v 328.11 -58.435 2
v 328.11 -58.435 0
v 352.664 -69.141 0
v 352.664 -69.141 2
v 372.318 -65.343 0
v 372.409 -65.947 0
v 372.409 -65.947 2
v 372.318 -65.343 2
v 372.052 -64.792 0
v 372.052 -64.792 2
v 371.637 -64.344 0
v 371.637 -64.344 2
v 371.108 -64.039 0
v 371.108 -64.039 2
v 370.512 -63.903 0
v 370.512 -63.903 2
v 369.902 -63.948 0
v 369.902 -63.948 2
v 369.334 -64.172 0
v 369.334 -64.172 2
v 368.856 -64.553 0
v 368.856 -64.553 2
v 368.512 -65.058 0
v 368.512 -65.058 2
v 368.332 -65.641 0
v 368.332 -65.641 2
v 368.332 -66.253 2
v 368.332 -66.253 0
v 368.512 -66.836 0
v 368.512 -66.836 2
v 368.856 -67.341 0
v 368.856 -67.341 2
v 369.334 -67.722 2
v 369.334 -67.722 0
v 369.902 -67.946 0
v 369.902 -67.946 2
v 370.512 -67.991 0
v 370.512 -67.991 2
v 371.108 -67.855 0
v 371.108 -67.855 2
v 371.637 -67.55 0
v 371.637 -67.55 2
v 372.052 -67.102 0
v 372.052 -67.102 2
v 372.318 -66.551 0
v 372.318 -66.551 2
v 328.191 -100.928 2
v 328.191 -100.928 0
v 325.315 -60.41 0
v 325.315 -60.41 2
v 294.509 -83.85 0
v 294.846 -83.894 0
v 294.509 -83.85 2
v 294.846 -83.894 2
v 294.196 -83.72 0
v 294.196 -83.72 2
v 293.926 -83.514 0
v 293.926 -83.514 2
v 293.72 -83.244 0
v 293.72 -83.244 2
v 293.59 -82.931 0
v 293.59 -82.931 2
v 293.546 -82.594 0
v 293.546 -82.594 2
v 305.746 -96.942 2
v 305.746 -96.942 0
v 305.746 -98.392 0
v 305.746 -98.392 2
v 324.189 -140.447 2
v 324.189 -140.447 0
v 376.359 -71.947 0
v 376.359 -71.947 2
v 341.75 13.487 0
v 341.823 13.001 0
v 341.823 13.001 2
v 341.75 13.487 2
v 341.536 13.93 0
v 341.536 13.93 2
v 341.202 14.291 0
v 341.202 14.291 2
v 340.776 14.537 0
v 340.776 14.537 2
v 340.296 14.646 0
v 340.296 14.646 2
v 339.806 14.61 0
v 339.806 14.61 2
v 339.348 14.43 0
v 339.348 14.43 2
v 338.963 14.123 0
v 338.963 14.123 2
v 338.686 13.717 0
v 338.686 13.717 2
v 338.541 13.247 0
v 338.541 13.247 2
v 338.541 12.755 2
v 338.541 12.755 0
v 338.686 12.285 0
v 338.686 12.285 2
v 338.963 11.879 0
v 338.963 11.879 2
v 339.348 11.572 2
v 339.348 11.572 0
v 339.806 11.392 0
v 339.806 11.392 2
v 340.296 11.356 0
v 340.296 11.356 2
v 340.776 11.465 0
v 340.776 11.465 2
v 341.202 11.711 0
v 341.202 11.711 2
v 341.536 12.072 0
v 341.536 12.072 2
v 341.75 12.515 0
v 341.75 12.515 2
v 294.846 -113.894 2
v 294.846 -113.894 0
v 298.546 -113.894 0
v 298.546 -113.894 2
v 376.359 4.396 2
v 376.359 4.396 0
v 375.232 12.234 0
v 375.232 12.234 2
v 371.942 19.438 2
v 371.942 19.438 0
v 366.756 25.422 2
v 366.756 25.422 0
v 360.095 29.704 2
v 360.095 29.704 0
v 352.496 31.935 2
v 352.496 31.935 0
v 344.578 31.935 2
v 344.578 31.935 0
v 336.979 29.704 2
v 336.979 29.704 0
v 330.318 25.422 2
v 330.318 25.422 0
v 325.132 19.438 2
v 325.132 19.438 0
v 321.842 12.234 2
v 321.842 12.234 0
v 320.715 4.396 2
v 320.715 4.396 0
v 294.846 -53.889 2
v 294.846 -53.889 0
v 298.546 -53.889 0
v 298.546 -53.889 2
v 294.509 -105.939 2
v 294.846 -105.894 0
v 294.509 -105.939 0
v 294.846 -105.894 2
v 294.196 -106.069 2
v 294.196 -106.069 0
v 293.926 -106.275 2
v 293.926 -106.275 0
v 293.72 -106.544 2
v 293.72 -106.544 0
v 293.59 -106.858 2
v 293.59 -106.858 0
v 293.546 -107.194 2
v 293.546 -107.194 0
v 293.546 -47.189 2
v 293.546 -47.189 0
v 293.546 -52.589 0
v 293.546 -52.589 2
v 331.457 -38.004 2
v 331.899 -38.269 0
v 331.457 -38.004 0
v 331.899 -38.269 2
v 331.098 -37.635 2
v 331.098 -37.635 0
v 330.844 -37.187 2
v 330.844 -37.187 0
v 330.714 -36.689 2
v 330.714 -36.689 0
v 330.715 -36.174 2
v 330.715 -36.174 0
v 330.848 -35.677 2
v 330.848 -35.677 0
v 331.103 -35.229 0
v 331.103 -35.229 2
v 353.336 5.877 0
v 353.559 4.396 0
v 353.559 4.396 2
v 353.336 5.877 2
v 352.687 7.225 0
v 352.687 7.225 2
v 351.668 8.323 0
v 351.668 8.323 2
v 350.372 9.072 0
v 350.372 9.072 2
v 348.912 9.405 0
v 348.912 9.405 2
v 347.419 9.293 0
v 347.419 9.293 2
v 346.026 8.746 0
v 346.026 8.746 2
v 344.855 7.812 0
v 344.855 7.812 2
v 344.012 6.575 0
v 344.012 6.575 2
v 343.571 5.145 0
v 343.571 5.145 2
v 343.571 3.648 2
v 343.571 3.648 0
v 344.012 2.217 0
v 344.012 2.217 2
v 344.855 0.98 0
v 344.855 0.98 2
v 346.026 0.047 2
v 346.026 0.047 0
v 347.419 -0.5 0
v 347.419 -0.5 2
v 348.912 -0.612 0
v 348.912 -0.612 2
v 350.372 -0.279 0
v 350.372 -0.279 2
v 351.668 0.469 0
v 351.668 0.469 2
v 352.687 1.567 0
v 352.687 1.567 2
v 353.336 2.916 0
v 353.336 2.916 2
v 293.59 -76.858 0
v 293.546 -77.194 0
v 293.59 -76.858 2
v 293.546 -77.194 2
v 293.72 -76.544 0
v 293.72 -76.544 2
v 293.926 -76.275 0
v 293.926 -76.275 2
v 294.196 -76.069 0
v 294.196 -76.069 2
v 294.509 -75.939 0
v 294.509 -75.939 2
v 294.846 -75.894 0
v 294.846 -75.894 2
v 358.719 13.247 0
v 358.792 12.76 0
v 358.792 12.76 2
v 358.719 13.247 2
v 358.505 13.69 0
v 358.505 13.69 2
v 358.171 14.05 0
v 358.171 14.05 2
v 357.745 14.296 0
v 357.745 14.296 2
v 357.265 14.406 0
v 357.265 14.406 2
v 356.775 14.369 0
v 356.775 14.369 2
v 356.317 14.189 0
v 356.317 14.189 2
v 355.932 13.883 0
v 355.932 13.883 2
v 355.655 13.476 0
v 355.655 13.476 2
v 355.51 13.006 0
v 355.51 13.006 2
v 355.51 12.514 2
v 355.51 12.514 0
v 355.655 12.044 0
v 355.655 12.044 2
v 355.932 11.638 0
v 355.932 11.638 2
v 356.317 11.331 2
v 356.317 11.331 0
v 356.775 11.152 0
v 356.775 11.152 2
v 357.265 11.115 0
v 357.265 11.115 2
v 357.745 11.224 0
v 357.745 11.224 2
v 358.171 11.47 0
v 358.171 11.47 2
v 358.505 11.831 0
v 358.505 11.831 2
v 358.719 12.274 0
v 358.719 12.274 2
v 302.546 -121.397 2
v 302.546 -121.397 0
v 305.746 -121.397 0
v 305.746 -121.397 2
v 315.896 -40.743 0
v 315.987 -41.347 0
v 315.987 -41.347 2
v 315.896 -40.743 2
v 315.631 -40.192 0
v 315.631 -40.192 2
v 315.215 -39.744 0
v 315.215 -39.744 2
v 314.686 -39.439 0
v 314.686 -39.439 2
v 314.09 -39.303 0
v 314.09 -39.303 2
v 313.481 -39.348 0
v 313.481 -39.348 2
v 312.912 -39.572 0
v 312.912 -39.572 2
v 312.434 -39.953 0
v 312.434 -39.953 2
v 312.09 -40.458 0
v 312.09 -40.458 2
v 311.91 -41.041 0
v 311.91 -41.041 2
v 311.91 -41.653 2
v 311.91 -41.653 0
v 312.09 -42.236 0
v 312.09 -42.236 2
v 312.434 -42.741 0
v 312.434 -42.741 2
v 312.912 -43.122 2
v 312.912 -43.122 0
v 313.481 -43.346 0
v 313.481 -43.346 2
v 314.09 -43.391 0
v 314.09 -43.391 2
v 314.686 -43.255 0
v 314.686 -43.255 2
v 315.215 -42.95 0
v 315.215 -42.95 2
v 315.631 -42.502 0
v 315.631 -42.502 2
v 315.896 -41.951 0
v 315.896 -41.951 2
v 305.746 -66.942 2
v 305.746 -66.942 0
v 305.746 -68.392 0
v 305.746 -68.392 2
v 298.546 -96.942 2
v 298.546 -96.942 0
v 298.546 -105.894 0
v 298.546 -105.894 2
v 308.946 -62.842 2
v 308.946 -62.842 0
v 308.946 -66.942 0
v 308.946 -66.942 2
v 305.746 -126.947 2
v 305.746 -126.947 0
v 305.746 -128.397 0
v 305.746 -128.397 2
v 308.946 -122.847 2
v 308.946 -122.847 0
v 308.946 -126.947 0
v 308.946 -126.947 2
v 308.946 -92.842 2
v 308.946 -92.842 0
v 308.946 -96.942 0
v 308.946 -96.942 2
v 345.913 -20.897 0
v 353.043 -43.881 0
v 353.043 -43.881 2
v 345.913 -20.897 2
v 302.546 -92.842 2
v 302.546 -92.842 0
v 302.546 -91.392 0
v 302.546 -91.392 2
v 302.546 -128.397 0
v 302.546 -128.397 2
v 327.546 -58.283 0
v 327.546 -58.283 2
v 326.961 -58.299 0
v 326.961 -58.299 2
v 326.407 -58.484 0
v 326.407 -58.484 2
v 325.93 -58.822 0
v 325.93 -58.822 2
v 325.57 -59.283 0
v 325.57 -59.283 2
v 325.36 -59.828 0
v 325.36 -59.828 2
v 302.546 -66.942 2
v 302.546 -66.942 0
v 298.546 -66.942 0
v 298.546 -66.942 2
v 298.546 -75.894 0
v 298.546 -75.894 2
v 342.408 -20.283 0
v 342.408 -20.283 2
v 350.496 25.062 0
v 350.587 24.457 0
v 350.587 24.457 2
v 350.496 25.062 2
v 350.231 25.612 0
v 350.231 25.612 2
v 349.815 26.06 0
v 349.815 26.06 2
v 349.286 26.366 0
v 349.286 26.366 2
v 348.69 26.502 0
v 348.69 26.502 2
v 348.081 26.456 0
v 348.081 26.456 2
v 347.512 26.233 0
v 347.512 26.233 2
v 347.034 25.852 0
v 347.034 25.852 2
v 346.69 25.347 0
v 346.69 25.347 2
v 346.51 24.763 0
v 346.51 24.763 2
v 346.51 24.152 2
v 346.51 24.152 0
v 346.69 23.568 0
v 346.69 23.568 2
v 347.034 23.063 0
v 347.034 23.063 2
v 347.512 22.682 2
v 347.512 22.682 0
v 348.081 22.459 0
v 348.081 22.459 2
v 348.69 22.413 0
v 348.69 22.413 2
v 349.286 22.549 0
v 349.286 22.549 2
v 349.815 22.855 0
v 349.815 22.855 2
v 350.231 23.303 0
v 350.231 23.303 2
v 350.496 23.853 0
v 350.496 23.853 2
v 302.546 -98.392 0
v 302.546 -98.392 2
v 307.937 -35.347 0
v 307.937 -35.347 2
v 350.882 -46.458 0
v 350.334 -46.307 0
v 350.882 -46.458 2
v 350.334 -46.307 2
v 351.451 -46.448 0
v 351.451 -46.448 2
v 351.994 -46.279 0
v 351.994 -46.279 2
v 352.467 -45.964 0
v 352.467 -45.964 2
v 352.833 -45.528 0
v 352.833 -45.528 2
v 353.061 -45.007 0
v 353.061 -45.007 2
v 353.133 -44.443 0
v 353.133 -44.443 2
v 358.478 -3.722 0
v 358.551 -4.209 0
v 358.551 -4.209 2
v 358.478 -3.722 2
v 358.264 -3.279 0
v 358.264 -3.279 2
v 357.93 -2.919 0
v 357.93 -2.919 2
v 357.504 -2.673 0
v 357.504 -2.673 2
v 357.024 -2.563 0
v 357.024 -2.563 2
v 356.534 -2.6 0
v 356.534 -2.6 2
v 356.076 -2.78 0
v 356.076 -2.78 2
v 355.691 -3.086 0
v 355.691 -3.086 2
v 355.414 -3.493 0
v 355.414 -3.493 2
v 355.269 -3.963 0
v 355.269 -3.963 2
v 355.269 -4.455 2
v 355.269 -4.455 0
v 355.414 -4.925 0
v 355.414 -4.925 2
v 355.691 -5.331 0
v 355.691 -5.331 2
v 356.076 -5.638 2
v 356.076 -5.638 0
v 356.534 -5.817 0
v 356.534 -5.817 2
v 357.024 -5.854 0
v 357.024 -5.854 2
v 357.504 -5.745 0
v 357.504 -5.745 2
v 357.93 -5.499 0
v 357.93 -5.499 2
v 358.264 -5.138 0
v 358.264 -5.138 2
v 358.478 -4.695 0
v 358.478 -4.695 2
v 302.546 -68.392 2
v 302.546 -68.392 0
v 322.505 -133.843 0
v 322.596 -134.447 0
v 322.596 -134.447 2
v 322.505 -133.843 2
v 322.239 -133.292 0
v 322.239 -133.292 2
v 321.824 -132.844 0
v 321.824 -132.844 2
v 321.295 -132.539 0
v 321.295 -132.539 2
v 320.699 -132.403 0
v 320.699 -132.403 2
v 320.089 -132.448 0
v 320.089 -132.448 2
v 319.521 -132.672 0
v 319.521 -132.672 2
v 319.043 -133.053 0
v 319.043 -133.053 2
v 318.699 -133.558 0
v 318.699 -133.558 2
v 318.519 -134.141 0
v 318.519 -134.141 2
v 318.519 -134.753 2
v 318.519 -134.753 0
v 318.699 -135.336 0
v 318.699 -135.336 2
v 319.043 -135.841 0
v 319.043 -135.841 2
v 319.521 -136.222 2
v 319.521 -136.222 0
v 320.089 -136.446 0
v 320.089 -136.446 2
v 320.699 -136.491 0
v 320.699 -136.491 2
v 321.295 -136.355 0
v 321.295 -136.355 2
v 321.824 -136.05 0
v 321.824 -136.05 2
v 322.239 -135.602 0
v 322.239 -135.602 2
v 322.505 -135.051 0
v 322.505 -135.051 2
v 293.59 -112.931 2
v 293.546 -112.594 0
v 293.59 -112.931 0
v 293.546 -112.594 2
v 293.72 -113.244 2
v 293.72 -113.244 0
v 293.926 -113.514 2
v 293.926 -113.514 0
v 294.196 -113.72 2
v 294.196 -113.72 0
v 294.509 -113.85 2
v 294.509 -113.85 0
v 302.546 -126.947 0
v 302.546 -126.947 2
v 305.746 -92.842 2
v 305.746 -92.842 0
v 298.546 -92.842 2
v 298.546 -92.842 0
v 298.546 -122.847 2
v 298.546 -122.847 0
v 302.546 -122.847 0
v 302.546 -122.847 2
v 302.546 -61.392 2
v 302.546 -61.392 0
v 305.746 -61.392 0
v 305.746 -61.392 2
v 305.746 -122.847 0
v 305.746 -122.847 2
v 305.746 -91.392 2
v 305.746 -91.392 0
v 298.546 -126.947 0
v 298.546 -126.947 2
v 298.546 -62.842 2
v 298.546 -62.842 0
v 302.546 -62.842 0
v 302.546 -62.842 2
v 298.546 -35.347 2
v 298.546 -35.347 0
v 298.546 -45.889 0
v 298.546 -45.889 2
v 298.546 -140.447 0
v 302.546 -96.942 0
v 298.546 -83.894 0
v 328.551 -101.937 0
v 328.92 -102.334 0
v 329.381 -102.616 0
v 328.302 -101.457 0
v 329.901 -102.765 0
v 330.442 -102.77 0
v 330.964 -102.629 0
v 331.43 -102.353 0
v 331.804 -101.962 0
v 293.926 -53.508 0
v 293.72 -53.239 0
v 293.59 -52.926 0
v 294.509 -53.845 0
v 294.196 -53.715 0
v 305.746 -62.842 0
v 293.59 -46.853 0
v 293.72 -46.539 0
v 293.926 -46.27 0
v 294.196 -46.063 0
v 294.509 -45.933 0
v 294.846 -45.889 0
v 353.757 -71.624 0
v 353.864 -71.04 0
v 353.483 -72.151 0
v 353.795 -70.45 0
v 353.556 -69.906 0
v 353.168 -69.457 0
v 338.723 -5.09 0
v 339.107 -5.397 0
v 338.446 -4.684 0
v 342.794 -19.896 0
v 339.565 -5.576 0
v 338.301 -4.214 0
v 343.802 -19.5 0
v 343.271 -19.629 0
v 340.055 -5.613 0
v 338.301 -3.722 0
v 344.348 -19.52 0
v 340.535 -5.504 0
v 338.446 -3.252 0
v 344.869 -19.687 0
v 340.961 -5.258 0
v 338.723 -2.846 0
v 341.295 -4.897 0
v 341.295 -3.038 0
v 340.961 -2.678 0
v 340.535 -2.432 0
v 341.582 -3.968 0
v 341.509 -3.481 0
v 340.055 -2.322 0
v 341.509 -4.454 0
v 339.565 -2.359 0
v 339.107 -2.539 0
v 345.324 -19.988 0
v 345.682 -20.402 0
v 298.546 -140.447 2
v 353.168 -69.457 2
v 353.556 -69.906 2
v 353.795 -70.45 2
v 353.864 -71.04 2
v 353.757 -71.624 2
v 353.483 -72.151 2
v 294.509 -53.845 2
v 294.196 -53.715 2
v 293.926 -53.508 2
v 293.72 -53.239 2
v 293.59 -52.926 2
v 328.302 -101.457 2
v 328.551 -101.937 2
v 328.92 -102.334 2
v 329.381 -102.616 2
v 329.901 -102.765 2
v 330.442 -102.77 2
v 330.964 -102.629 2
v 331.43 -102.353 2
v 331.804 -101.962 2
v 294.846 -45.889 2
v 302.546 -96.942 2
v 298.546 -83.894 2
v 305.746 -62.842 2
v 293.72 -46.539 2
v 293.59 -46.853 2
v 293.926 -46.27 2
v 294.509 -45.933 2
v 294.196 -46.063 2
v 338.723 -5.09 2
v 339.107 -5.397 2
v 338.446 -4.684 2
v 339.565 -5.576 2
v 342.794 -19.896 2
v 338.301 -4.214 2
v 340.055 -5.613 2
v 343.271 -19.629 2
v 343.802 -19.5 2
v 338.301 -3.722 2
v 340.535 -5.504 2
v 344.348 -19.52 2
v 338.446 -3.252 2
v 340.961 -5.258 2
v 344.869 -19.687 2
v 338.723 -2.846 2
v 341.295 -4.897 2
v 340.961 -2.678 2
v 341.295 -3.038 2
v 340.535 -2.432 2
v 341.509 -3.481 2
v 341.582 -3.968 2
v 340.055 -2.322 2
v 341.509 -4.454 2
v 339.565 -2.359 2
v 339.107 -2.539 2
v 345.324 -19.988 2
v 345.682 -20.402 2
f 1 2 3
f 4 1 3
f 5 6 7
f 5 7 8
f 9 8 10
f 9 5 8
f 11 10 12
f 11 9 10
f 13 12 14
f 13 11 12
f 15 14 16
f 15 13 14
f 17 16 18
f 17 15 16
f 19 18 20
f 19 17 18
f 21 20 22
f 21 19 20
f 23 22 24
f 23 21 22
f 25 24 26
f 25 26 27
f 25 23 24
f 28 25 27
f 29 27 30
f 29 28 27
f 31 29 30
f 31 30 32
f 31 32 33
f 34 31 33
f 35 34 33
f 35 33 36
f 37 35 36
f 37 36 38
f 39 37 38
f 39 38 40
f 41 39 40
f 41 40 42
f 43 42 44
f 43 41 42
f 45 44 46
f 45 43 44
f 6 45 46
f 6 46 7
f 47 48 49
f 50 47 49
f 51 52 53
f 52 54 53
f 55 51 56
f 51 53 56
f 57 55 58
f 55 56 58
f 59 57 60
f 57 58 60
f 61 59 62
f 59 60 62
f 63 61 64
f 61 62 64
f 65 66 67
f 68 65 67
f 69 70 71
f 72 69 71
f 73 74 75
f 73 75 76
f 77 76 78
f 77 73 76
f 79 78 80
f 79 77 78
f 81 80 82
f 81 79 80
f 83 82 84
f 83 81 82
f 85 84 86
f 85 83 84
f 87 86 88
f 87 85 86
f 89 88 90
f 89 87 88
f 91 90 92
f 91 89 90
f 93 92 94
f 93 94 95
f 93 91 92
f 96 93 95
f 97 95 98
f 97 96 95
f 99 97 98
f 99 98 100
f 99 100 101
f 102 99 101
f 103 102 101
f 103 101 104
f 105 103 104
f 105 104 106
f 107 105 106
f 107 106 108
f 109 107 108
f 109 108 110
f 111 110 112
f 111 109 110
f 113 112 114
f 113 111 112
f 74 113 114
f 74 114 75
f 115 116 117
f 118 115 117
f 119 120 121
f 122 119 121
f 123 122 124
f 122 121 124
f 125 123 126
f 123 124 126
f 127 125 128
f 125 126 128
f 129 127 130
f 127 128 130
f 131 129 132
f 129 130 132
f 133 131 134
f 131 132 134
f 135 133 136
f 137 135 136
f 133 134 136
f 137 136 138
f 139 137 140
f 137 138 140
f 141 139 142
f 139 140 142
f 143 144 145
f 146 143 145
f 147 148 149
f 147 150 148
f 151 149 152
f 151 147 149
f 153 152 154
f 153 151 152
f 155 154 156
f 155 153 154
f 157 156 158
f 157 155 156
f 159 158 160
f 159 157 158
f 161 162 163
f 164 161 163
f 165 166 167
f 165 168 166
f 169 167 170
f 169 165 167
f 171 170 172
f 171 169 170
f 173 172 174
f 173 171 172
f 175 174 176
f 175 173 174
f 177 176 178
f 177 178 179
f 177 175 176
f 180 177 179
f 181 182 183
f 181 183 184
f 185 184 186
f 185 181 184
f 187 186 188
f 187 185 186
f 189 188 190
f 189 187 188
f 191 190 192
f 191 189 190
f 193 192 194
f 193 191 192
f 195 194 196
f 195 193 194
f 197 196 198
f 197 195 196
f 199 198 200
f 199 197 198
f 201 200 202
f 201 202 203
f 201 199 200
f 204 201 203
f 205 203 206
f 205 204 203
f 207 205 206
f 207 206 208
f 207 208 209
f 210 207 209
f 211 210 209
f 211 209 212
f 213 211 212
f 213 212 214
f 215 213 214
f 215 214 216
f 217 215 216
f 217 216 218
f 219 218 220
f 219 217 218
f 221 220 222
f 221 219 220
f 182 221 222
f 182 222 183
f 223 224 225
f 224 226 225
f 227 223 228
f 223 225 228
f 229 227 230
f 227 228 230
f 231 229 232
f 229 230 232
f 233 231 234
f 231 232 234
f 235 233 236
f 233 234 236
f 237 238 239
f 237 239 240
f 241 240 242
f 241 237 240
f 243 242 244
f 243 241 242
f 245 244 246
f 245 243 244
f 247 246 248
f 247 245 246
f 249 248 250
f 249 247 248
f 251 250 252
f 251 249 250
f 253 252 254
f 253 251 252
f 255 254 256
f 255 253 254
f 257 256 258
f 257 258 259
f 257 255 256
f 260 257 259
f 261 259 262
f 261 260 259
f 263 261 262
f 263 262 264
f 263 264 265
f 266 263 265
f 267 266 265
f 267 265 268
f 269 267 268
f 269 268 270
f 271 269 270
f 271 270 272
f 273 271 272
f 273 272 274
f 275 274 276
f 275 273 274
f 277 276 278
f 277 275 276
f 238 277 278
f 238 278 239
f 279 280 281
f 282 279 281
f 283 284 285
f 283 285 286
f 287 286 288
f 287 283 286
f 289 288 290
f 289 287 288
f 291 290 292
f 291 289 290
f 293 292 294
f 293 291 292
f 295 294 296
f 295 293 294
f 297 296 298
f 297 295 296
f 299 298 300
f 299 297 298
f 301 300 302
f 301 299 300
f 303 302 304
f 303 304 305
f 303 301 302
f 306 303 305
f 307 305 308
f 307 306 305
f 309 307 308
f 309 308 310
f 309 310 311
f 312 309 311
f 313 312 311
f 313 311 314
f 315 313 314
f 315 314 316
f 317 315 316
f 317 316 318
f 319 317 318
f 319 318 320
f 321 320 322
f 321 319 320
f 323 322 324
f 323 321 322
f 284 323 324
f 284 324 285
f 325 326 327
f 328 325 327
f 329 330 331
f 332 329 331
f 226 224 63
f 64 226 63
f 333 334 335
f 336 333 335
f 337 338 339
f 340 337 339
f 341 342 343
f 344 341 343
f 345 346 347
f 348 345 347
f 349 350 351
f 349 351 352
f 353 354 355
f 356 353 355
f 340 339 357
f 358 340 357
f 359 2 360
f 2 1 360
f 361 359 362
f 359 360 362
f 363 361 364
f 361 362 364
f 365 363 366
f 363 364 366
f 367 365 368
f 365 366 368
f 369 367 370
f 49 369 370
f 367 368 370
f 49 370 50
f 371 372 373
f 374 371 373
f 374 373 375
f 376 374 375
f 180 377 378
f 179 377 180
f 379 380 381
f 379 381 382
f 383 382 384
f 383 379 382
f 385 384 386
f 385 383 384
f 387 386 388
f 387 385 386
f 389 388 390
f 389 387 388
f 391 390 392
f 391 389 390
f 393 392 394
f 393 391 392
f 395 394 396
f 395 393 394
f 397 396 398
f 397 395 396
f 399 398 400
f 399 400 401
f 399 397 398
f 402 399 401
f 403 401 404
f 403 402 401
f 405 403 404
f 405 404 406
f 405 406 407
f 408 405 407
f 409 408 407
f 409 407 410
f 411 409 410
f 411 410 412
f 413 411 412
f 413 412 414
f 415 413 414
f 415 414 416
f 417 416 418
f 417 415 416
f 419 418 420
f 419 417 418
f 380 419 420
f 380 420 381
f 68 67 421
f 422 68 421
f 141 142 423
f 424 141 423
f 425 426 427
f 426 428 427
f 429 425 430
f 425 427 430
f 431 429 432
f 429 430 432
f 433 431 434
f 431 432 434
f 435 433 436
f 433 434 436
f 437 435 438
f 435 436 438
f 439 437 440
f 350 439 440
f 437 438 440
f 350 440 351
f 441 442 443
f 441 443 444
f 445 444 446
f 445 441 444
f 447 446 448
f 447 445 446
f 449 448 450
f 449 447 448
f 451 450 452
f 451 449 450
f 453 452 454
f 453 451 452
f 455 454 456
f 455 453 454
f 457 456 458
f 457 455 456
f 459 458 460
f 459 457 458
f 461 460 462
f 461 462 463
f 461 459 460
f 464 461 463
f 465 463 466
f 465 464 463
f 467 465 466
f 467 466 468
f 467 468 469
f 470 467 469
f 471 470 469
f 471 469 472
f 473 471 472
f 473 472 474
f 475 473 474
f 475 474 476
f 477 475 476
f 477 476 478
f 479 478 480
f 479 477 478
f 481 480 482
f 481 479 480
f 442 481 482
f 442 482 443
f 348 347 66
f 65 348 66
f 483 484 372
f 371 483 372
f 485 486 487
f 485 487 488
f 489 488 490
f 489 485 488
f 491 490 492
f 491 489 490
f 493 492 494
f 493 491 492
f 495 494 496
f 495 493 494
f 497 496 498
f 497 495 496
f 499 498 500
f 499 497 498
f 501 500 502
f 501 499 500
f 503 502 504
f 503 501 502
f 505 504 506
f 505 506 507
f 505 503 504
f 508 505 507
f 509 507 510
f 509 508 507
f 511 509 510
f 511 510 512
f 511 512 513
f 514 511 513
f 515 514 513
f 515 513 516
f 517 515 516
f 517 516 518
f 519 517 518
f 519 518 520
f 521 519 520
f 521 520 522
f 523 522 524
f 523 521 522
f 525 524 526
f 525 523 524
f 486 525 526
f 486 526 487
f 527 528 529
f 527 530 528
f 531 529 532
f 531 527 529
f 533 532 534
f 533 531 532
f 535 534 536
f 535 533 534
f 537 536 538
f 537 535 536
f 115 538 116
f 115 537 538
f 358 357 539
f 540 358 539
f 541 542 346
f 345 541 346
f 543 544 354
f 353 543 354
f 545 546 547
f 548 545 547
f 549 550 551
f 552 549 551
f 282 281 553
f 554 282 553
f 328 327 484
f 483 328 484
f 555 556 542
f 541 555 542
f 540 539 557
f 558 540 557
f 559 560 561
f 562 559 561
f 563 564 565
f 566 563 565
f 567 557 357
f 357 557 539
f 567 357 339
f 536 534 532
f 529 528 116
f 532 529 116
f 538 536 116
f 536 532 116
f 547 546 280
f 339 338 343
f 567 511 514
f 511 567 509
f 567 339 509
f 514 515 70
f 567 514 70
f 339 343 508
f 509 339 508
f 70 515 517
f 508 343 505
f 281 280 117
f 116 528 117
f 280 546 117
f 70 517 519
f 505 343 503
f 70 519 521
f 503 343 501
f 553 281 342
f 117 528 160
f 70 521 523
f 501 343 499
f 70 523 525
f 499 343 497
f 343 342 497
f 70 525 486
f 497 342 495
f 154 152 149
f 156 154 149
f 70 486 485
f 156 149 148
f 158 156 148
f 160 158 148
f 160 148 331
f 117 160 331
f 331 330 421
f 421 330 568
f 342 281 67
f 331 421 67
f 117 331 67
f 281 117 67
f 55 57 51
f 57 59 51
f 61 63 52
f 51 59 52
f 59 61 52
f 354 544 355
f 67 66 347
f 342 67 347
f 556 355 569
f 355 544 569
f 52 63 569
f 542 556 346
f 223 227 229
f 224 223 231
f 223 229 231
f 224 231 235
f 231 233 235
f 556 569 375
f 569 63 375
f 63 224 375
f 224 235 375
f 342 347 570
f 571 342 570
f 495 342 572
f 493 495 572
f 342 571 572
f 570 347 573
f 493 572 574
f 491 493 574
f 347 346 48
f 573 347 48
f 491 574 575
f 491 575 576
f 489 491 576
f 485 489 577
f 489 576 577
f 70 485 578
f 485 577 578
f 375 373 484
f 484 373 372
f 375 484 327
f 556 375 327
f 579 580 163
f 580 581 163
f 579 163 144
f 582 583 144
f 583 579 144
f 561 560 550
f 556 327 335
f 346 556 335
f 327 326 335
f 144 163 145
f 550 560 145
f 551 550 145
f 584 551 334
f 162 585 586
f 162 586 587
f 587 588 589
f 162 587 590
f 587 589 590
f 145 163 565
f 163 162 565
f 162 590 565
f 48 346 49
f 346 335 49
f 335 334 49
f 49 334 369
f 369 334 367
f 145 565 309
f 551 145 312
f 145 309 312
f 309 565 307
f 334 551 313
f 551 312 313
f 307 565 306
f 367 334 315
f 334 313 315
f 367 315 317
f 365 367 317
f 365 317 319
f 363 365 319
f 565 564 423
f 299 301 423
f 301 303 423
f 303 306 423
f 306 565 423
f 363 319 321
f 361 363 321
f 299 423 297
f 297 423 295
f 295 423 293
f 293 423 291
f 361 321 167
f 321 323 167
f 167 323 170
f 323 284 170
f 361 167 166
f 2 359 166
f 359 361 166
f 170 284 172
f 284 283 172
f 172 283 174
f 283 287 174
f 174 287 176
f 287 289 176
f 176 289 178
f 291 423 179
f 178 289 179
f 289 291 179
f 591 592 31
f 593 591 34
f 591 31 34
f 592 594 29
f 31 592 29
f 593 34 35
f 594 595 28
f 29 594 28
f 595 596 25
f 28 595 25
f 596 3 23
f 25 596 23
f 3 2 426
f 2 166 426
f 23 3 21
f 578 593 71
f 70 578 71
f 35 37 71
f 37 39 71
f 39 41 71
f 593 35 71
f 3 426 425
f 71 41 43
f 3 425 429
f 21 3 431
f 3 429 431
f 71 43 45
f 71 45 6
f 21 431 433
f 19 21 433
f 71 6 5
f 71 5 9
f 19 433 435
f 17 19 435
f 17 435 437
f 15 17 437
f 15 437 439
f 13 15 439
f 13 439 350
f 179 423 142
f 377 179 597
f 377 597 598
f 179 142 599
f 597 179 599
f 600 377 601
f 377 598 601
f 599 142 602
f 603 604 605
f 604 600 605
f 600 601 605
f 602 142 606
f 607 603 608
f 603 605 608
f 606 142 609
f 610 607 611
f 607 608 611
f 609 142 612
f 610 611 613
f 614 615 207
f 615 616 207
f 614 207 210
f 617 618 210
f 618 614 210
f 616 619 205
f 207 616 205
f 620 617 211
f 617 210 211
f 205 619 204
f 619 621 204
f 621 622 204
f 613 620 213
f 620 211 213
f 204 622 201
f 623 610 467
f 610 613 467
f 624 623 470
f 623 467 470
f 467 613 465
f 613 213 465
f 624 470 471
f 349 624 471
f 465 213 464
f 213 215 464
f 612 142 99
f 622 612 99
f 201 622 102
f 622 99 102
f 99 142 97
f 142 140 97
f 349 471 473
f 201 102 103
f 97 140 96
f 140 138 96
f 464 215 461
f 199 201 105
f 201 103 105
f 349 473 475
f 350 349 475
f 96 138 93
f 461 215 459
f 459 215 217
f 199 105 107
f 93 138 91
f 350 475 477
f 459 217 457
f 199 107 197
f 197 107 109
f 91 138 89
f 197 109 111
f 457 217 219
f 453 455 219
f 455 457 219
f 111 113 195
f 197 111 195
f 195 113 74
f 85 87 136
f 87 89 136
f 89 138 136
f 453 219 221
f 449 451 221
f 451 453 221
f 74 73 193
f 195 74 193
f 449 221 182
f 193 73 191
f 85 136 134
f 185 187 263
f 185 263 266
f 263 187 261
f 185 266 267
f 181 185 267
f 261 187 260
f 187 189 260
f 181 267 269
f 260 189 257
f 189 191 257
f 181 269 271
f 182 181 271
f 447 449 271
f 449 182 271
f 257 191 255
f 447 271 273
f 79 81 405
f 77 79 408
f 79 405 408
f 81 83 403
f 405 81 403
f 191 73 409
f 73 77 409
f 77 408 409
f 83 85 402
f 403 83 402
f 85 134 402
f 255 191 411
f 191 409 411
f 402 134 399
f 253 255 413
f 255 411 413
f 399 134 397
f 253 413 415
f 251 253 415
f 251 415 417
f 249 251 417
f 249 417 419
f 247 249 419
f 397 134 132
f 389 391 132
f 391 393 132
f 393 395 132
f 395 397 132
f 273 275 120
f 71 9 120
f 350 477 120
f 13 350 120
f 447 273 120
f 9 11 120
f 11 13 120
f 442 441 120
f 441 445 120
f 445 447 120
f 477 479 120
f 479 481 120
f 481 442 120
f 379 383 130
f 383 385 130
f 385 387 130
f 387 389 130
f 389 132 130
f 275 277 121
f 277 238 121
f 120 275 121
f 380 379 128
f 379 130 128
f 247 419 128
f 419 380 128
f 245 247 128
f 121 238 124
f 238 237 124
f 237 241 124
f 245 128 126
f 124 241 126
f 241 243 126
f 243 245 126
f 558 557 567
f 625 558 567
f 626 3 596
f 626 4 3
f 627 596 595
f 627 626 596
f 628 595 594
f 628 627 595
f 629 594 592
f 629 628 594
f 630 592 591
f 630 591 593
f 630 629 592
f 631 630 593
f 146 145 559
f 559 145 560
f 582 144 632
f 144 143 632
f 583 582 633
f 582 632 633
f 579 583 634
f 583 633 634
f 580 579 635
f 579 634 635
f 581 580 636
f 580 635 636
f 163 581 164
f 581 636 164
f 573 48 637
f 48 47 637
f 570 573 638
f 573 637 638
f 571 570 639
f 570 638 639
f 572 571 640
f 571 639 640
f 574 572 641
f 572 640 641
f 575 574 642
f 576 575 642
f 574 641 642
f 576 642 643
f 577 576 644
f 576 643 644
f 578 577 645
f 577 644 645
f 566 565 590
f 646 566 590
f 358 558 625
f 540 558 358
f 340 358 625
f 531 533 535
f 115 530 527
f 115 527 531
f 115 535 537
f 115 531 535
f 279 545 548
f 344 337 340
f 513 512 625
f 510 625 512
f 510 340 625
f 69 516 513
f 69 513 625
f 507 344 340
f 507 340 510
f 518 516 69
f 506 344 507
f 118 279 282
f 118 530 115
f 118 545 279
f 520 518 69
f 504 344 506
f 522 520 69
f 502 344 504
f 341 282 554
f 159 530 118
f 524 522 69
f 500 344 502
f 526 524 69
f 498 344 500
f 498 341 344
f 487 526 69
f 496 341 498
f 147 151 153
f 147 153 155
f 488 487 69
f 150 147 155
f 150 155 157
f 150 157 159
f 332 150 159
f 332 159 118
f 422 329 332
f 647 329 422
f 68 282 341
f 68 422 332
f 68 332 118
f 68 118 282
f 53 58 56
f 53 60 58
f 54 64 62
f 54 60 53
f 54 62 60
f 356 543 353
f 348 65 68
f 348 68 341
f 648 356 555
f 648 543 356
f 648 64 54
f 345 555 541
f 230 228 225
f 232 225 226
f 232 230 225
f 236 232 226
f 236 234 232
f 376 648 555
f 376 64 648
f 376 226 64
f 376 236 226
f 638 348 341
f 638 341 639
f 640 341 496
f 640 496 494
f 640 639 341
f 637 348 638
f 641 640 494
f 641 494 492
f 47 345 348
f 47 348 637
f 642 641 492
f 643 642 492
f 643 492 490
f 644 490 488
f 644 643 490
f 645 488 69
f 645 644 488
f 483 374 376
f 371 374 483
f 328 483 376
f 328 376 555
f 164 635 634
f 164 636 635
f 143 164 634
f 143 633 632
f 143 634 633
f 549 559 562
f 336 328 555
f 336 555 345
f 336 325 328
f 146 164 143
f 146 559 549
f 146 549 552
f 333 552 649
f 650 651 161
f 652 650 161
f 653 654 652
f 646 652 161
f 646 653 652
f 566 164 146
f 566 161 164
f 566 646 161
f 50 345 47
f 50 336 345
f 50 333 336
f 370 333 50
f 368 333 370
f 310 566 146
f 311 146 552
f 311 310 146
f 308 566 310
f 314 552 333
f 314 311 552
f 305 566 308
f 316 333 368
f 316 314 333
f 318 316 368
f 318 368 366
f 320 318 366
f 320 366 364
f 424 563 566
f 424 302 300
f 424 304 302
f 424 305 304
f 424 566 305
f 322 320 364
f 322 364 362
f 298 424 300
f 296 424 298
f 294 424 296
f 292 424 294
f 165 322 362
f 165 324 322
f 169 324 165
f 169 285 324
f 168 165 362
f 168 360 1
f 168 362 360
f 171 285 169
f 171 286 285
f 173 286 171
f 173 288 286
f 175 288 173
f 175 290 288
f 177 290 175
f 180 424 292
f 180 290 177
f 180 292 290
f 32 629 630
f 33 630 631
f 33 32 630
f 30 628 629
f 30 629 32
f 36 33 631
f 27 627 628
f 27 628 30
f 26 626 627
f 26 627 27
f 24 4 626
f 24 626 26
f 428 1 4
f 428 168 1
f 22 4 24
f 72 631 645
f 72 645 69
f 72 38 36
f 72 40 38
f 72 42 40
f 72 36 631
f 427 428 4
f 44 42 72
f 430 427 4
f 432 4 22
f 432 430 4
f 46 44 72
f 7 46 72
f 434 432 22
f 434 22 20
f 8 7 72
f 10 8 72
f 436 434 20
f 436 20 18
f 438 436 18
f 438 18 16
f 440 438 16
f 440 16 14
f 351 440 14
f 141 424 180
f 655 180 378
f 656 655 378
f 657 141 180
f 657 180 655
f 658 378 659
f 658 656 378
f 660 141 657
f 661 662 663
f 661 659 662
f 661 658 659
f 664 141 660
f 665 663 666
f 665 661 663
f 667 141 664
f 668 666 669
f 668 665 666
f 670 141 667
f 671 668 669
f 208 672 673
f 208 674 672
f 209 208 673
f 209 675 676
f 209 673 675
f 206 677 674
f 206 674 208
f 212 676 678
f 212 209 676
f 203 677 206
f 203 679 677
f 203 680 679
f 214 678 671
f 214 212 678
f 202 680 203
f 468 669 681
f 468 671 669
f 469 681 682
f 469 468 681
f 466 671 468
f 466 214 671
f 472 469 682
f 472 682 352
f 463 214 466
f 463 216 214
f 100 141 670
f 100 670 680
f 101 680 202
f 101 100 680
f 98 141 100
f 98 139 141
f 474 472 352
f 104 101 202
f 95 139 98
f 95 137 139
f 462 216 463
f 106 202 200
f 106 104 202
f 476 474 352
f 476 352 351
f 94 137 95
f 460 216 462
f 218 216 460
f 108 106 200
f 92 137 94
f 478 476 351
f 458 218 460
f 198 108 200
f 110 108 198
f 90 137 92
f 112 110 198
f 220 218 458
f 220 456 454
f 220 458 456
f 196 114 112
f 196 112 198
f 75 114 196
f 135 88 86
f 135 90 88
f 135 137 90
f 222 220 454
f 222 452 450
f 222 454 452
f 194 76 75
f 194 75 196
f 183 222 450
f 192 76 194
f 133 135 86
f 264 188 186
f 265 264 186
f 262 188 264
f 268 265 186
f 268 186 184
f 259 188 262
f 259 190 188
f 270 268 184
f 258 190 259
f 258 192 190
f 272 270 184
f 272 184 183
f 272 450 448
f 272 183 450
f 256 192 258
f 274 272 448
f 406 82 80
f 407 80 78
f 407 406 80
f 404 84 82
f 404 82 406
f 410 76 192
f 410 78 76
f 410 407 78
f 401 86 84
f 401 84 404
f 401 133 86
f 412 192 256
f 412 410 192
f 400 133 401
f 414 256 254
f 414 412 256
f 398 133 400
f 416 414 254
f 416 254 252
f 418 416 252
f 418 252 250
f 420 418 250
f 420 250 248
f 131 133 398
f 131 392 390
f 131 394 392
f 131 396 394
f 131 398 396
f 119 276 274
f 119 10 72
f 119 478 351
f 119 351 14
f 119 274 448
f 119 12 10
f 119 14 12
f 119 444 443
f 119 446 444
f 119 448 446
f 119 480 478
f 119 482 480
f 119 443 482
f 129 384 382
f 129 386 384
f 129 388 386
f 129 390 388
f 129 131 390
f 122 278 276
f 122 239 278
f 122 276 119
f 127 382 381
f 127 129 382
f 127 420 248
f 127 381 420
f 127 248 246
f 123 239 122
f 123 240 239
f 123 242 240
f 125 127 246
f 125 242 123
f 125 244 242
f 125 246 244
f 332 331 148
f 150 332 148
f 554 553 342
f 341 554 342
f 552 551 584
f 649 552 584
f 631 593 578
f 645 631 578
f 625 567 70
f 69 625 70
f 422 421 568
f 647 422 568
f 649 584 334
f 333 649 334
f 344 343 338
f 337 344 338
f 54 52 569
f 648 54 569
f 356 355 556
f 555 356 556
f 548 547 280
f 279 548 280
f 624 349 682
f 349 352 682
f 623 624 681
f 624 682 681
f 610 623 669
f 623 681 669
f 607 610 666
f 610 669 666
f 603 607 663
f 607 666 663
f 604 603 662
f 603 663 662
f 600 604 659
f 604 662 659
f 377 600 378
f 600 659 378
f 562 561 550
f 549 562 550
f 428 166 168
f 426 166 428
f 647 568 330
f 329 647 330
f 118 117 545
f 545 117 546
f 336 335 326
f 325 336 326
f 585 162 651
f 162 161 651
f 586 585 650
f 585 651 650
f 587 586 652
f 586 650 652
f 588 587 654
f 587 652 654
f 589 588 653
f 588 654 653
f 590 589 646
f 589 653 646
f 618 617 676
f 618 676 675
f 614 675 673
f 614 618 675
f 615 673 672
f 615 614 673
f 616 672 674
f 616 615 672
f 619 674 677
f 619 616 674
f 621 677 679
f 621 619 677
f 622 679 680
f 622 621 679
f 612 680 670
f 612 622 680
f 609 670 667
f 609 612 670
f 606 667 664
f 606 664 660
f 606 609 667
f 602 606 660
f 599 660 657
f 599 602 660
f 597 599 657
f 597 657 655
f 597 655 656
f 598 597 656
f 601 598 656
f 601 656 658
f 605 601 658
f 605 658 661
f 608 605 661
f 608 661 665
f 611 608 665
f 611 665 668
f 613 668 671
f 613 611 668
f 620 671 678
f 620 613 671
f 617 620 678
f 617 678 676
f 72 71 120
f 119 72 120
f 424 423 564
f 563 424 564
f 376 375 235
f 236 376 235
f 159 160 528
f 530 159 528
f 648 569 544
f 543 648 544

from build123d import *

# Parameters (mm, degrees)
SKETCH_1_R      = 5.0225
SKETCH_1_R_2    = 2.05
SKETCH_1_R_3    = 1.649999998
EXTRUDE_1_DEPTH = 2
FILLET_1_R      = 2
FILLET_2_R      = 1.3


with BuildPart() as part:
    # 草图1 → 凸台-拉伸1 (new body)
    with BuildSketch(Plane.XY):
        with BuildLine():
            Line((298.545628784, -83.894391363), (298.545628784, -92.841778663))
            Line((298.545628784, -92.841778663), (302.545628784, -92.841778663))
            Line((302.545628784, -92.841778663), (302.545628784, -91.391778663))
            Line((302.545628784, -91.391778663), (305.745628784, -91.391778663))
            Line((305.745628784, -91.391778663), (305.745628784, -92.841778663))
            Line((305.745628784, -92.841778663), (308.945628784, -92.841778663))
            Line((308.945628784, -92.841778663), (308.945628784, -96.941778663))
            Line((308.945628784, -96.941778663), (305.745628784, -96.941778663))
            Line((305.745628784, -96.941778663), (305.745628784, -98.391778663))
            Line((305.745628784, -98.391778663), (302.545628784, -98.391778663))
            Line((302.545628784, -98.391778663), (302.545628784, -96.941778663))
            Line((302.545628784, -96.941778663), (298.545628784, -96.941778663))
            Line((298.545628784, -96.941778663), (298.545628784, -105.894391358))
            Line((298.545628784, -105.894391358), (293.545628784, -105.894391358))
            Line((293.545628784, -105.894391358), (293.545628784, -113.894391358))
            Line((293.545628784, -113.894391358), (298.545628784, -113.894391358))
            Line((298.545628784, -113.894391358), (298.545628784, -122.847004054))
            Line((298.545628784, -122.847004054), (302.545628784, -122.847004054))
            Line((302.545628784, -122.847004054), (302.545628784, -121.397004054))
            Line((302.545628784, -121.397004054), (305.745628784, -121.397004054))
            Line((305.745628784, -121.397004054), (305.745628784, -122.847004054))
            Line((305.745628784, -122.847004054), (308.945628784, -122.847004054))
            Line((308.945628784, -122.847004054), (308.945628784, -126.947004054))
            Line((308.945628784, -126.947004054), (305.745628784, -126.947004054))
            Line((305.745628784, -126.947004054), (305.745628784, -128.397004054))
            Line((305.745628784, -128.397004054), (302.545628784, -128.397004054))
            Line((302.545628784, -128.397004054), (302.545628784, -126.947004054))
            Line((302.545628784, -126.947004054), (298.545628784, -126.947004054))
            Line((298.545628784, -126.947004054), (298.545628784, -140.447004054))
            Line((298.545628784, -140.447004054), (324.188862368, -140.447004054))
            Line((324.188862368, -140.447004054), (376.358604426, -71.946984141))
            Line((376.358604426, -71.946984141), (376.358604426, 4.396201153))
            ThreePointArc((376.358604426, 4.396201153), (348.536987634, 32.217817945), (320.715370843, 4.396201153))
            Line((320.715370843, 4.396201153), (307.936987634, -35.346984141))
            Line((307.936987634, -35.346984141), (298.545628784, -35.346984141))
            Line((298.545628784, -35.346984141), (298.545628784, -45.889165972))
            Line((298.545628784, -45.889165972), (293.545628784, -45.889165972))
            Line((293.545628784, -45.889165972), (293.545628784, -53.889165972))
            Line((293.545628784, -53.889165972), (298.545628784, -53.889165972))
            Line((298.545628784, -53.889165972), (298.545628784, -62.841778668))
            Line((298.545628784, -62.841778668), (302.545628784, -62.841778668))
            Line((302.545628784, -62.841778668), (302.545628784, -61.391778668))
            Line((302.545628784, -61.391778668), (305.745628784, -61.391778668))
            Line((305.745628784, -61.391778668), (305.745628784, -62.841778668))
            Line((305.745628784, -62.841778668), (308.945628784, -62.841778668))
            Line((308.945628784, -62.841778668), (308.945628784, -66.941778668))
            Line((308.945628784, -66.941778668), (305.745628784, -66.941778668))
            Line((305.745628784, -66.941778668), (305.745628784, -68.391778668))
            Line((305.745628784, -68.391778668), (302.545628784, -68.391778668))
            Line((302.545628784, -68.391778668), (302.545628784, -66.941778668))
            Line((302.545628784, -66.941778668), (298.545628784, -66.941778668))
            Line((298.545628784, -66.941778668), (298.545628784, -75.894391363))
            Line((298.545628784, -75.894391363), (293.545628784, -75.894391363))
            Line((293.545628784, -75.894391363), (293.545628784, -83.894391363))
            Line((293.545628784, -83.894391363), (298.545628784, -83.894391363))
        make_face()
        with Locations((348.536987634, 4.396201153)):
            Circle(SKETCH_1_R, mode=Mode.SUBTRACT)
        with Locations((348.537256281, 24.457337504)):
            Circle(SKETCH_1_R_2, mode=Mode.SUBTRACT)
        with Locations((320.545628784, -134.447004054)):
            Circle(SKETCH_1_R_2, mode=Mode.SUBTRACT)
        with Locations((370.358604426, -65.946984141)):
            Circle(SKETCH_1_R_2, mode=Mode.SUBTRACT)
        with Locations((313.936987634, -41.346984141)):
            Circle(SKETCH_1_R_2, mode=Mode.SUBTRACT)
        with Locations((340.172950793, 13.001018857)):
            Circle(SKETCH_1_R_3, mode=Mode.SUBTRACT)
        with Locations((357.141805339, 12.760237994)):
            Circle(SKETCH_1_R_3, mode=Mode.SUBTRACT)
        with Locations((356.901024475, -4.208616551)):
            Circle(SKETCH_1_R_3, mode=Mode.SUBTRACT)
        with Locations((339.93216993, -3.967835688)):
            Circle(SKETCH_1_R_3, mode=Mode.SUBTRACT)
        Polygon((354.947285032, -70.136765586), (328.579617375, -106.396108383), (325.08144343, -57.115165973), align=None, mode=Mode.SUBTRACT)
        Polygon((329.571126451, -37.254352656), (354.337315751, -48.052488042), (344.758747766, -17.175445836), align=None, mode=Mode.SUBTRACT)
    extrude(amount=EXTRUDE_1_DEPTH)

    # 圆角1
    fillet_1_edges = [part.edges().sort_by_distance(p)[0] for p in [
        (354.947285032, -70.136765586, 1),
        (325.08144343, -57.115165973, 1),
        (328.579617375, -106.396108383, 1),
        (344.758747766, -17.175445836, 1),
        (329.571126451, -37.254352656, 1),
        (354.337315751, -48.052488042, 1),
    ]]
    fillet(fillet_1_edges, radius=FILLET_1_R)

    # 圆角2
    fillet_2_edges = [part.edges().sort_by_distance(p)[0] for p in [
        (293.545628784, -113.894391358, 1),
        (293.545628784, -105.894391358, 1),
        (293.545628784, -83.894391363, 1),
        (293.545628784, -75.894391363, 1),
        (293.545628784, -53.889165972, 1),
        (293.545628784, -45.889165972, 1),
    ]]
    fillet(fillet_2_edges, radius=FILLET_2_R)


solid = part.part
